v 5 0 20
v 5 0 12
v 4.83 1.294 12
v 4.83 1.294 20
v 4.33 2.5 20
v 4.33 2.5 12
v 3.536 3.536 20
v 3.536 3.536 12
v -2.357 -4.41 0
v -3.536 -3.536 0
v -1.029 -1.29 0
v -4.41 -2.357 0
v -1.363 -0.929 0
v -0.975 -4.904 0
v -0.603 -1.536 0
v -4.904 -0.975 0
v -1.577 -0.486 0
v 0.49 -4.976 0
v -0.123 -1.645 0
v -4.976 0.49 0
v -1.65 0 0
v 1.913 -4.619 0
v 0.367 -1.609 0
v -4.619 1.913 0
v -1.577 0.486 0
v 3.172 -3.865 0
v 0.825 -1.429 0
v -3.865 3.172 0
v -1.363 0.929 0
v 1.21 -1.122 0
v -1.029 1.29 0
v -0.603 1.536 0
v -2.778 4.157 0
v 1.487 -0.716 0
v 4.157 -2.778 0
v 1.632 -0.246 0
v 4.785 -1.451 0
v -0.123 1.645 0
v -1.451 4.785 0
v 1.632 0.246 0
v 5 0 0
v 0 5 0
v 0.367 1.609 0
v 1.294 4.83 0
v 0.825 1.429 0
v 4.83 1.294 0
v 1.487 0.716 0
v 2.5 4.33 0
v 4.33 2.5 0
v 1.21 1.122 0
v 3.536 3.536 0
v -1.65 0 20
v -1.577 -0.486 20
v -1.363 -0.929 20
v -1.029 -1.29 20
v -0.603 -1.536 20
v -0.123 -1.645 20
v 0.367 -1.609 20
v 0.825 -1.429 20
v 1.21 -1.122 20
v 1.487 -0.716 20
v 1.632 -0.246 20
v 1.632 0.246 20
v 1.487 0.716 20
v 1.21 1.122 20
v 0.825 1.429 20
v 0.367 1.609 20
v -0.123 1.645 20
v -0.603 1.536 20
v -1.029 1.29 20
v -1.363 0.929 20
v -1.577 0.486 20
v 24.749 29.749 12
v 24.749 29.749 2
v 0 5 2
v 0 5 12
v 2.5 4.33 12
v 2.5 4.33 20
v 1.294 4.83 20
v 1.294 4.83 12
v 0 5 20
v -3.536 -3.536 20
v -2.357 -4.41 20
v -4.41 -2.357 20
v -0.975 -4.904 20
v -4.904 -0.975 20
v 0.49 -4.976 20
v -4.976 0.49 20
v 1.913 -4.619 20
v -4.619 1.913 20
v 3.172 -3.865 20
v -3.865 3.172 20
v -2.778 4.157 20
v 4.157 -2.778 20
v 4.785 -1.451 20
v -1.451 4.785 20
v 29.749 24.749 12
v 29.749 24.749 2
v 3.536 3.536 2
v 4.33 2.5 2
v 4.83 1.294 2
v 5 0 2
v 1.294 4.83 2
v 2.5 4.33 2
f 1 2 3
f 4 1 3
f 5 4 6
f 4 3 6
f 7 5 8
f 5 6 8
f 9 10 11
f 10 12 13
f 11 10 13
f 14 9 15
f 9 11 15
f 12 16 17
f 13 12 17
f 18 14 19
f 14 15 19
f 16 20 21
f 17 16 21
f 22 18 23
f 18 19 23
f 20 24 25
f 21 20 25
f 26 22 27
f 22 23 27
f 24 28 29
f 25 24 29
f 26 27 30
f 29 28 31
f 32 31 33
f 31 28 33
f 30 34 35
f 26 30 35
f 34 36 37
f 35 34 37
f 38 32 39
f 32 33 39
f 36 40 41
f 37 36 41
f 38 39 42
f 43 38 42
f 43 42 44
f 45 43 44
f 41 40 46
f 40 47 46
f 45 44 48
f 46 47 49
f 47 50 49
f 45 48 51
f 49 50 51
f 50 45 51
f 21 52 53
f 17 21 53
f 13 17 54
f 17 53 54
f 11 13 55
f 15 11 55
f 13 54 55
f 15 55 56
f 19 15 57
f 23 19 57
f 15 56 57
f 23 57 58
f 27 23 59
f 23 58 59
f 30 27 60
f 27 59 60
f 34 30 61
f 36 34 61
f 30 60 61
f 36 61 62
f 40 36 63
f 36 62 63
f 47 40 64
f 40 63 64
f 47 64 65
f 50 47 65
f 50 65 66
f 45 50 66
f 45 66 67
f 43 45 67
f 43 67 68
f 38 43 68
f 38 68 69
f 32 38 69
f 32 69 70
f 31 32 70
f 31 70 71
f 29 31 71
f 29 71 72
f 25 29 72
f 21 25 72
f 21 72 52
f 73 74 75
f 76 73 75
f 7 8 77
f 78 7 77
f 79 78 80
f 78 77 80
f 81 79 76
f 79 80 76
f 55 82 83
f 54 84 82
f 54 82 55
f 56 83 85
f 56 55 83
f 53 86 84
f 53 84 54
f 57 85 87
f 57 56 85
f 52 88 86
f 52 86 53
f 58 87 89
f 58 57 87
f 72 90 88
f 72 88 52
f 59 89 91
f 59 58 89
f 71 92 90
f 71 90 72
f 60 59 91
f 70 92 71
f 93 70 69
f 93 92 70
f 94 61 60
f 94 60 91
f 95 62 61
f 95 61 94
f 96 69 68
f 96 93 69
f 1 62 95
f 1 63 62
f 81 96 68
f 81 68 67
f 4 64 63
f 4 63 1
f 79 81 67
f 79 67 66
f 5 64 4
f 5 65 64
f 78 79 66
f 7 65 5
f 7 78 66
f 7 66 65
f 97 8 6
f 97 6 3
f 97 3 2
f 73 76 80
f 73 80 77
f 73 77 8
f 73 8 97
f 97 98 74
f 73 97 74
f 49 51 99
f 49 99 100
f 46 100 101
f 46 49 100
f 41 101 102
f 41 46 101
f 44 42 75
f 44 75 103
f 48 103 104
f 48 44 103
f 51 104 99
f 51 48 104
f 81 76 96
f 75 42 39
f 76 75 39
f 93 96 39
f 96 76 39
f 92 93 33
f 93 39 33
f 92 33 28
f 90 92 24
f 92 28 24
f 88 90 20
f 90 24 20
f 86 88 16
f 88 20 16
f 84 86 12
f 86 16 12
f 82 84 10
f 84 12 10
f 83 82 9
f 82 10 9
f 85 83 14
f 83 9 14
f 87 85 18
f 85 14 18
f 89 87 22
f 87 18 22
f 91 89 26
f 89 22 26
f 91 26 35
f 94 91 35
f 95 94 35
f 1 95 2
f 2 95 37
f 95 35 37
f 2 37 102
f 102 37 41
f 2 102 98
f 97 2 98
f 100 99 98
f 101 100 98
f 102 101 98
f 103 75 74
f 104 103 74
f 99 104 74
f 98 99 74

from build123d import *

# Parameters (mm, degrees)
F1_DEPTH = 20
F2_DEPTH = 12
F3_DEPTH = 2
F4_D     = 3.3


with BuildPart() as f1:
    # F0 (on Top) → F1 (new body)
    with BuildSketch(Plane.XY):
        with BuildLine():
            Line((0, 0), (0, 5))
            ThreePointArc((0, 5), (-3.5355339059, -3.5355339059), (5, 0))
            Line((5, 0), (0, 0))
        make_face()
        with BuildLine():
            Line((0, 0), (5, 0))
            ThreePointArc((5, 0), (4.6193976626, 1.9134171618), (3.5355339059, 3.5355339059))
            Line((3.5355339059, 3.5355339059), (0, 0))
        make_face()
        with BuildLine():
            ThreePointArc((3.5355339059, 3.5355339059), (1.9134171618, 4.6193976626), (0, 5))
            Line((0, 5), (0, 0))
            Line((0, 0), (3.5355339059, 3.5355339059))
        make_face()
    extrude(amount=F1_DEPTH)

    # F0 (on Top) → F2 (join)
    with BuildSketch(Plane.XY):
        with BuildLine():
            Line((24.7487373415, 29.7487373415), (0, 5))
            ThreePointArc((0, 5), (1.9134171618, 4.6193976626), (3.5355339059, 3.5355339059))
            ThreePointArc((3.5355339059, 3.5355339059), (4.6193976626, 1.9134171618), (5, 0))
            Line((5, 0), (29.7487373415, 24.7487373415))
            Line((29.7487373415, 24.7487373415), (24.7487373415, 29.7487373415))
        make_face()
    extrude(amount=F2_DEPTH)

    # F0 (on Top) → F3 (cut)
    with BuildSketch(Plane.XY):
        with BuildLine():
            Line((24.7487373415, 29.7487373415), (0, 5))
            ThreePointArc((0, 5), (1.9134171618, 4.6193976626), (3.5355339059, 3.5355339059))
            ThreePointArc((3.5355339059, 3.5355339059), (4.6193976626, 1.9134171618), (5, 0))
            Line((5, 0), (29.7487373415, 24.7487373415))
            Line((29.7487373415, 24.7487373415), (24.7487373415, 29.7487373415))
        make_face()
    extrude(amount=F3_DEPTH, mode=Mode.SUBTRACT)

    # F4 (through all)
    with Locations(Plane(origin=(0, 0, 0), x_dir=(1, 0, 0), z_dir=(0, 0, -1))):
        with Locations((0, 0)):
            Hole(F4_D / 2)


solid = f1.part
